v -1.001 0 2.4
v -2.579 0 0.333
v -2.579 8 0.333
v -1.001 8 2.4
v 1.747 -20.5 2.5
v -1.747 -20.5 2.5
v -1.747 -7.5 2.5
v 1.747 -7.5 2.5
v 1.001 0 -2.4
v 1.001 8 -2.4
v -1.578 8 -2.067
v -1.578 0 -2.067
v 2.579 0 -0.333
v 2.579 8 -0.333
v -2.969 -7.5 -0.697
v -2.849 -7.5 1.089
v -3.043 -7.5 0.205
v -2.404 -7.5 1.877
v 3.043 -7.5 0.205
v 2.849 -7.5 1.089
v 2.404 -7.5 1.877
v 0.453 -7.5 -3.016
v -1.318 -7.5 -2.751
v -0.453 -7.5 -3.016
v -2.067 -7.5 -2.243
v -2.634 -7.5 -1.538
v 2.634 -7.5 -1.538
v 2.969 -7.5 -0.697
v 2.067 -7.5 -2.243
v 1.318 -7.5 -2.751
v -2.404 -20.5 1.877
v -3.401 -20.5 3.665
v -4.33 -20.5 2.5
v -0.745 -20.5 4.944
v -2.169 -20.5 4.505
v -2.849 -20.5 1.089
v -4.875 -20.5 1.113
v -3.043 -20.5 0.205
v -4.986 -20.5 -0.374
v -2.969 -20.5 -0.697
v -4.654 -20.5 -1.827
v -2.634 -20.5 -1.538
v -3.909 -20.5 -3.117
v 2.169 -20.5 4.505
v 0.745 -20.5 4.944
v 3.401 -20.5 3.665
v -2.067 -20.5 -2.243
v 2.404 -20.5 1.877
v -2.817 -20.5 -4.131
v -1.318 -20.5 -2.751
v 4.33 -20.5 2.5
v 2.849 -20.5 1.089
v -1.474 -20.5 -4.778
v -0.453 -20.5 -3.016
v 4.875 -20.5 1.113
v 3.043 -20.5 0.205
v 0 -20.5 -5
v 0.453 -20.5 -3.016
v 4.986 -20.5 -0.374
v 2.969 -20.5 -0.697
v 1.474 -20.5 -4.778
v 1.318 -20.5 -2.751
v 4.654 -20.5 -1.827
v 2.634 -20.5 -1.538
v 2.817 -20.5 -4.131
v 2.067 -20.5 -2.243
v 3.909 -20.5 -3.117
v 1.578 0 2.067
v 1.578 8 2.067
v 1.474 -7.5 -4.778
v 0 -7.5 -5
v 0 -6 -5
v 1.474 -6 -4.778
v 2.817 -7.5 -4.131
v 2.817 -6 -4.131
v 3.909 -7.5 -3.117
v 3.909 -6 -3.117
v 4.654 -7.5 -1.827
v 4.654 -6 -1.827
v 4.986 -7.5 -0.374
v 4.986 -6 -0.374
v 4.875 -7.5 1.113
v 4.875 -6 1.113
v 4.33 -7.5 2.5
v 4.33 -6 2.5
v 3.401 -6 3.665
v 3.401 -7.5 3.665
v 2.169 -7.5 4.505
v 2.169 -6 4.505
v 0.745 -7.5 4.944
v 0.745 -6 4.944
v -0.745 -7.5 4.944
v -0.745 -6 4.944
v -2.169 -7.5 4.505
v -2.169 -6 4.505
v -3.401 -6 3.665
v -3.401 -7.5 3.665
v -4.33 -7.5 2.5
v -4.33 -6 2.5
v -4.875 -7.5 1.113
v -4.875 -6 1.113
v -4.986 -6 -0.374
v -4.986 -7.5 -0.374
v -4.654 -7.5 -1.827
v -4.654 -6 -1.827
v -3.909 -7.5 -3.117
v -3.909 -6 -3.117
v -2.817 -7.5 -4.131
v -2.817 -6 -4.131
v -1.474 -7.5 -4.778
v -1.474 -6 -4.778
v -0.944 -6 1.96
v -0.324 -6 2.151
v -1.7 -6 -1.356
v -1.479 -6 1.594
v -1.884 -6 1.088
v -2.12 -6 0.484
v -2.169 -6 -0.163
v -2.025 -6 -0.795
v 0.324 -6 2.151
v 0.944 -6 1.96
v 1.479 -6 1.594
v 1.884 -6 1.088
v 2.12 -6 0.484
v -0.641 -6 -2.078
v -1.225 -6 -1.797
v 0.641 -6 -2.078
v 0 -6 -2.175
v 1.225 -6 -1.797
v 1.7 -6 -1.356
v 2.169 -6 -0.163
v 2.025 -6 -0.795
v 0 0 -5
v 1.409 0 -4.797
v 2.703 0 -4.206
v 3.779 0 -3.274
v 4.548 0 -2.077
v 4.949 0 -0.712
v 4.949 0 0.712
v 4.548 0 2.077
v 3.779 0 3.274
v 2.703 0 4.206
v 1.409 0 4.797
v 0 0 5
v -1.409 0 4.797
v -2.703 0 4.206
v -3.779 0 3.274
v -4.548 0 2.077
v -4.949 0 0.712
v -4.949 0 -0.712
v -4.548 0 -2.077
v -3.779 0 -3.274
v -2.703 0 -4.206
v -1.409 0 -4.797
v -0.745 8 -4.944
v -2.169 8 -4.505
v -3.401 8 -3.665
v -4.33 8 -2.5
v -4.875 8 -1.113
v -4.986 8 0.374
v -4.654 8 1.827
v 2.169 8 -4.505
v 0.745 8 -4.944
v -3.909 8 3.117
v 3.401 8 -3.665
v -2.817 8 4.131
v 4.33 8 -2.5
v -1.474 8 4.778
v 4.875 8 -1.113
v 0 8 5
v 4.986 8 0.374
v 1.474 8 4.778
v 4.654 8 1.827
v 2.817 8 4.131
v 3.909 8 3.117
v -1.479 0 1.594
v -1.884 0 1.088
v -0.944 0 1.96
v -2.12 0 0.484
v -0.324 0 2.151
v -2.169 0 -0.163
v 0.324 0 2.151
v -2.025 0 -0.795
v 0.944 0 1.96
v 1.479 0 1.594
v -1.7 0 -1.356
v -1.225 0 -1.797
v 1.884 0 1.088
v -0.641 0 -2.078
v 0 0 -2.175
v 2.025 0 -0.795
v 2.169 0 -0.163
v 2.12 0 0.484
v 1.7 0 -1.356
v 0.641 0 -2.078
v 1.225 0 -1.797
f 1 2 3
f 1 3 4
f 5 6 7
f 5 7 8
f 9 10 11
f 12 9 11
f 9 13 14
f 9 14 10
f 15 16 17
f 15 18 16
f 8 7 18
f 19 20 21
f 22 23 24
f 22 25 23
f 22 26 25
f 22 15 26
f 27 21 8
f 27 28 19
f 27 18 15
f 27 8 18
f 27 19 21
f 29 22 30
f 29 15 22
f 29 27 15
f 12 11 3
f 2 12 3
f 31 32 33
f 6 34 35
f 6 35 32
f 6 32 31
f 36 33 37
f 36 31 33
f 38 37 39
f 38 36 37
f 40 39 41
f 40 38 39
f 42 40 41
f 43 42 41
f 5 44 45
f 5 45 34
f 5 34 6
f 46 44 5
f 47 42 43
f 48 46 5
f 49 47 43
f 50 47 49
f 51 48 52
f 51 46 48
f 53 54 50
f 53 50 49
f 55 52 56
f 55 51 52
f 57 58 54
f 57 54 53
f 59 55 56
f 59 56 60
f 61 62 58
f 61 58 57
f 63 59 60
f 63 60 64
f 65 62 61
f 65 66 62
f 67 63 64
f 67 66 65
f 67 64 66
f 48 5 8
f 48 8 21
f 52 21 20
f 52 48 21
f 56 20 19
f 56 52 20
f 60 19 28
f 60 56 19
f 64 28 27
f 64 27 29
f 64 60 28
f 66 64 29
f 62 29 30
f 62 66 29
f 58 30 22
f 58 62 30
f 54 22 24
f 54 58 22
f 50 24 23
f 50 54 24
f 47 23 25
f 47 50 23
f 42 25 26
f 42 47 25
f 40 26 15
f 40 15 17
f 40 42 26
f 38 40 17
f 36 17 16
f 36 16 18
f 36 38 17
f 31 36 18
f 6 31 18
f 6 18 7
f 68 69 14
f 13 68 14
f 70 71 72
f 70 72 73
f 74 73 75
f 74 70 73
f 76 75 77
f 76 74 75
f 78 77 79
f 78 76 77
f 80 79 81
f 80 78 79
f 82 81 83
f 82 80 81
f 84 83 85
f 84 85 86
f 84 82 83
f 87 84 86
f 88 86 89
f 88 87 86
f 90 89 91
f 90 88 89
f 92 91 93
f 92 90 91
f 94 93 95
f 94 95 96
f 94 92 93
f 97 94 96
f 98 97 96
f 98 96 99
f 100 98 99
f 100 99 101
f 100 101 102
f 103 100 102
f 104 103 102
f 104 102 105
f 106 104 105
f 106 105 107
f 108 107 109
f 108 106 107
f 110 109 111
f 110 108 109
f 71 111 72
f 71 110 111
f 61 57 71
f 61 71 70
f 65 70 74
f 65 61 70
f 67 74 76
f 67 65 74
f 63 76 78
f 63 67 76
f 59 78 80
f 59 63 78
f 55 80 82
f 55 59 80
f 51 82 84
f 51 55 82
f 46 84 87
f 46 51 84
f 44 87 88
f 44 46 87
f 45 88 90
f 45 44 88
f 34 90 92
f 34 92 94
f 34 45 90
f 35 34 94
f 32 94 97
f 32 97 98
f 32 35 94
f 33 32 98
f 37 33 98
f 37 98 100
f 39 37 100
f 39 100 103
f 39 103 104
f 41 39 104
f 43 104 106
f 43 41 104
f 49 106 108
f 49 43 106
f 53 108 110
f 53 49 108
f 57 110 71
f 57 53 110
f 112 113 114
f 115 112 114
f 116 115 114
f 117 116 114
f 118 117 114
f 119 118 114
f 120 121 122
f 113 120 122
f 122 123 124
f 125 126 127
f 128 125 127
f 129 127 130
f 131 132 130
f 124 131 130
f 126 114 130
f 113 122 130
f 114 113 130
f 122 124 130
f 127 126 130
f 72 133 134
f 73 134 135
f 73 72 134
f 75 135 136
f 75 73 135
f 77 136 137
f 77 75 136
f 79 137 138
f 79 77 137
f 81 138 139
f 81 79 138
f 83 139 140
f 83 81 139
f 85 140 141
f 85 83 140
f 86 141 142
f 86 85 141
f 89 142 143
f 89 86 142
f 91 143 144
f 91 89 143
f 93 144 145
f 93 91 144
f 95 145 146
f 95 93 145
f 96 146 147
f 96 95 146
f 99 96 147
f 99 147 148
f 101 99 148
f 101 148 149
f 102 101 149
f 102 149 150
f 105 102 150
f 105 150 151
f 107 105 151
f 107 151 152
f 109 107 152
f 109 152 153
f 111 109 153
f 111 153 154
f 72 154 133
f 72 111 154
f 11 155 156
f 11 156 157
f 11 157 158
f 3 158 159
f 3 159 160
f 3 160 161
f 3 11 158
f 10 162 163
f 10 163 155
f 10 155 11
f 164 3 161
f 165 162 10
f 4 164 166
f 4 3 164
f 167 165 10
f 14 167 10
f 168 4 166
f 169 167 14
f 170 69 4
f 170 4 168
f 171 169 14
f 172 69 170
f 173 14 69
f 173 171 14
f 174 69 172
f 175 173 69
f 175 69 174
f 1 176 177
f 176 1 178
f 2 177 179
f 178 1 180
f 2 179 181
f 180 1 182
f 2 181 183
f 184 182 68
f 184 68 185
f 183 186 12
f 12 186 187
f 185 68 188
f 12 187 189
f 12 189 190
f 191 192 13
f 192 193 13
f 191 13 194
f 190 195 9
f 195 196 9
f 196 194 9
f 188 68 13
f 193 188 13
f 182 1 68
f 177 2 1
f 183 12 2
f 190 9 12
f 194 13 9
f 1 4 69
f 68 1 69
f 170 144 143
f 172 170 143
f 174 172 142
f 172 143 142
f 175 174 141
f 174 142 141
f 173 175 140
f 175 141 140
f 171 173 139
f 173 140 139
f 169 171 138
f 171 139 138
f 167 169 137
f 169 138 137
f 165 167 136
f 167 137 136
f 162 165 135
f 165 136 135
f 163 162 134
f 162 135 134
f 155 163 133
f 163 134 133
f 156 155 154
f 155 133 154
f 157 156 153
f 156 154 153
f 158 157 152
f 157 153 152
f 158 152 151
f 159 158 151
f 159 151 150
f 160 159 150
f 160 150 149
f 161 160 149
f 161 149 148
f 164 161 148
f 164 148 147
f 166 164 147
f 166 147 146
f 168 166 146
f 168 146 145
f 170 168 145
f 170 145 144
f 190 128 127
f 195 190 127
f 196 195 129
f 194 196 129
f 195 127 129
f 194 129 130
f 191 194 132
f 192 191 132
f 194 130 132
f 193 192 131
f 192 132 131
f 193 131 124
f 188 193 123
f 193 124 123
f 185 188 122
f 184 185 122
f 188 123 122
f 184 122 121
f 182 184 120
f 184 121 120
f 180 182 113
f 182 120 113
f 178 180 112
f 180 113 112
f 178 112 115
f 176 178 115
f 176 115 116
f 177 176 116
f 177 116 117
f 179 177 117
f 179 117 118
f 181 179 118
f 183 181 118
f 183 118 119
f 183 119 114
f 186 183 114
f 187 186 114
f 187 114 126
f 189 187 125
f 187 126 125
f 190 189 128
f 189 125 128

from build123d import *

# Parameters (mm, degrees)
SKETCH1_R           = 5
BOSS_EXTRUDE1_DEPTH = 8
BOSS_EXTRUDE2_START = 6
SKETCH2_R           = 5
SKETCH2_R_2         = 2.175
BOSS_EXTRUDE2_DEPTH = 6
BOSS_EXTRUDE3_START = 1.5
SKETCH3_R           = 5
BOSS_EXTRUDE3_DEPTH = 1.5
BOSS_EXTRUDE4_START = 13
SKETCH4_R           = 5
BOSS_EXTRUDE4_DEPTH = 13


with BuildPart() as part:
    # Sketch1 → Boss-Extrude1 (new body)
    with BuildSketch(Plane(origin=(0, 0, 0), x_dir=(1, 0, 0), z_dir=(0, 1, 0))):
        with Locations(Location((0, 0, 0), (0, 0, 270))):
            Circle(SKETCH1_R)
        Polygon((1.577657476, -2.066639032), (2.57859064, 0.332971936), (1.000933165, 2.399610968), (-1.577657476, 2.066639032), (-2.57859064, -0.332971936), (-1.000933165, -2.399610968), align=None, mode=Mode.SUBTRACT)
    extrude(amount=BOSS_EXTRUDE1_DEPTH)

    # Sketch2 → Boss-Extrude2 (add)
    with BuildSketch(Plane.XZ.offset(BOSS_EXTRUDE2_START)):
        with Locations(Location((0, 0, 0), (0, 0, 270))):
            Circle(SKETCH2_R)
        with Locations(Location((0, 0, 0), (0, 0, 270))):
            Circle(SKETCH2_R_2, mode=Mode.SUBTRACT)
    extrude(amount=-BOSS_EXTRUDE2_DEPTH)

    # Sketch3 → Boss-Extrude3 (add)
    with BuildSketch(Plane.XZ.offset(6).offset(BOSS_EXTRUDE3_START)):
        with Locations(Location((0, 0, 0), (0, 0, 270))):
            Circle(SKETCH3_R)
    extrude(amount=-BOSS_EXTRUDE3_DEPTH)

    # Sketch4 → Boss-Extrude4 (add)
    with BuildSketch(Plane.XZ.offset(7.5).offset(BOSS_EXTRUDE4_START)):
        with Locations(Location((0, 0, 0), (0, 0, 270))):
            Circle(SKETCH4_R)
        with BuildLine():
            Line((-1.747140521, 2.5), (1.747140521, 2.5))
            ThreePointArc((1.747140521, 2.5), (0, -3.05), (-1.747140521, 2.5))
        make_face(mode=Mode.SUBTRACT)
    extrude(amount=-BOSS_EXTRUDE4_DEPTH)


solid = part.part
